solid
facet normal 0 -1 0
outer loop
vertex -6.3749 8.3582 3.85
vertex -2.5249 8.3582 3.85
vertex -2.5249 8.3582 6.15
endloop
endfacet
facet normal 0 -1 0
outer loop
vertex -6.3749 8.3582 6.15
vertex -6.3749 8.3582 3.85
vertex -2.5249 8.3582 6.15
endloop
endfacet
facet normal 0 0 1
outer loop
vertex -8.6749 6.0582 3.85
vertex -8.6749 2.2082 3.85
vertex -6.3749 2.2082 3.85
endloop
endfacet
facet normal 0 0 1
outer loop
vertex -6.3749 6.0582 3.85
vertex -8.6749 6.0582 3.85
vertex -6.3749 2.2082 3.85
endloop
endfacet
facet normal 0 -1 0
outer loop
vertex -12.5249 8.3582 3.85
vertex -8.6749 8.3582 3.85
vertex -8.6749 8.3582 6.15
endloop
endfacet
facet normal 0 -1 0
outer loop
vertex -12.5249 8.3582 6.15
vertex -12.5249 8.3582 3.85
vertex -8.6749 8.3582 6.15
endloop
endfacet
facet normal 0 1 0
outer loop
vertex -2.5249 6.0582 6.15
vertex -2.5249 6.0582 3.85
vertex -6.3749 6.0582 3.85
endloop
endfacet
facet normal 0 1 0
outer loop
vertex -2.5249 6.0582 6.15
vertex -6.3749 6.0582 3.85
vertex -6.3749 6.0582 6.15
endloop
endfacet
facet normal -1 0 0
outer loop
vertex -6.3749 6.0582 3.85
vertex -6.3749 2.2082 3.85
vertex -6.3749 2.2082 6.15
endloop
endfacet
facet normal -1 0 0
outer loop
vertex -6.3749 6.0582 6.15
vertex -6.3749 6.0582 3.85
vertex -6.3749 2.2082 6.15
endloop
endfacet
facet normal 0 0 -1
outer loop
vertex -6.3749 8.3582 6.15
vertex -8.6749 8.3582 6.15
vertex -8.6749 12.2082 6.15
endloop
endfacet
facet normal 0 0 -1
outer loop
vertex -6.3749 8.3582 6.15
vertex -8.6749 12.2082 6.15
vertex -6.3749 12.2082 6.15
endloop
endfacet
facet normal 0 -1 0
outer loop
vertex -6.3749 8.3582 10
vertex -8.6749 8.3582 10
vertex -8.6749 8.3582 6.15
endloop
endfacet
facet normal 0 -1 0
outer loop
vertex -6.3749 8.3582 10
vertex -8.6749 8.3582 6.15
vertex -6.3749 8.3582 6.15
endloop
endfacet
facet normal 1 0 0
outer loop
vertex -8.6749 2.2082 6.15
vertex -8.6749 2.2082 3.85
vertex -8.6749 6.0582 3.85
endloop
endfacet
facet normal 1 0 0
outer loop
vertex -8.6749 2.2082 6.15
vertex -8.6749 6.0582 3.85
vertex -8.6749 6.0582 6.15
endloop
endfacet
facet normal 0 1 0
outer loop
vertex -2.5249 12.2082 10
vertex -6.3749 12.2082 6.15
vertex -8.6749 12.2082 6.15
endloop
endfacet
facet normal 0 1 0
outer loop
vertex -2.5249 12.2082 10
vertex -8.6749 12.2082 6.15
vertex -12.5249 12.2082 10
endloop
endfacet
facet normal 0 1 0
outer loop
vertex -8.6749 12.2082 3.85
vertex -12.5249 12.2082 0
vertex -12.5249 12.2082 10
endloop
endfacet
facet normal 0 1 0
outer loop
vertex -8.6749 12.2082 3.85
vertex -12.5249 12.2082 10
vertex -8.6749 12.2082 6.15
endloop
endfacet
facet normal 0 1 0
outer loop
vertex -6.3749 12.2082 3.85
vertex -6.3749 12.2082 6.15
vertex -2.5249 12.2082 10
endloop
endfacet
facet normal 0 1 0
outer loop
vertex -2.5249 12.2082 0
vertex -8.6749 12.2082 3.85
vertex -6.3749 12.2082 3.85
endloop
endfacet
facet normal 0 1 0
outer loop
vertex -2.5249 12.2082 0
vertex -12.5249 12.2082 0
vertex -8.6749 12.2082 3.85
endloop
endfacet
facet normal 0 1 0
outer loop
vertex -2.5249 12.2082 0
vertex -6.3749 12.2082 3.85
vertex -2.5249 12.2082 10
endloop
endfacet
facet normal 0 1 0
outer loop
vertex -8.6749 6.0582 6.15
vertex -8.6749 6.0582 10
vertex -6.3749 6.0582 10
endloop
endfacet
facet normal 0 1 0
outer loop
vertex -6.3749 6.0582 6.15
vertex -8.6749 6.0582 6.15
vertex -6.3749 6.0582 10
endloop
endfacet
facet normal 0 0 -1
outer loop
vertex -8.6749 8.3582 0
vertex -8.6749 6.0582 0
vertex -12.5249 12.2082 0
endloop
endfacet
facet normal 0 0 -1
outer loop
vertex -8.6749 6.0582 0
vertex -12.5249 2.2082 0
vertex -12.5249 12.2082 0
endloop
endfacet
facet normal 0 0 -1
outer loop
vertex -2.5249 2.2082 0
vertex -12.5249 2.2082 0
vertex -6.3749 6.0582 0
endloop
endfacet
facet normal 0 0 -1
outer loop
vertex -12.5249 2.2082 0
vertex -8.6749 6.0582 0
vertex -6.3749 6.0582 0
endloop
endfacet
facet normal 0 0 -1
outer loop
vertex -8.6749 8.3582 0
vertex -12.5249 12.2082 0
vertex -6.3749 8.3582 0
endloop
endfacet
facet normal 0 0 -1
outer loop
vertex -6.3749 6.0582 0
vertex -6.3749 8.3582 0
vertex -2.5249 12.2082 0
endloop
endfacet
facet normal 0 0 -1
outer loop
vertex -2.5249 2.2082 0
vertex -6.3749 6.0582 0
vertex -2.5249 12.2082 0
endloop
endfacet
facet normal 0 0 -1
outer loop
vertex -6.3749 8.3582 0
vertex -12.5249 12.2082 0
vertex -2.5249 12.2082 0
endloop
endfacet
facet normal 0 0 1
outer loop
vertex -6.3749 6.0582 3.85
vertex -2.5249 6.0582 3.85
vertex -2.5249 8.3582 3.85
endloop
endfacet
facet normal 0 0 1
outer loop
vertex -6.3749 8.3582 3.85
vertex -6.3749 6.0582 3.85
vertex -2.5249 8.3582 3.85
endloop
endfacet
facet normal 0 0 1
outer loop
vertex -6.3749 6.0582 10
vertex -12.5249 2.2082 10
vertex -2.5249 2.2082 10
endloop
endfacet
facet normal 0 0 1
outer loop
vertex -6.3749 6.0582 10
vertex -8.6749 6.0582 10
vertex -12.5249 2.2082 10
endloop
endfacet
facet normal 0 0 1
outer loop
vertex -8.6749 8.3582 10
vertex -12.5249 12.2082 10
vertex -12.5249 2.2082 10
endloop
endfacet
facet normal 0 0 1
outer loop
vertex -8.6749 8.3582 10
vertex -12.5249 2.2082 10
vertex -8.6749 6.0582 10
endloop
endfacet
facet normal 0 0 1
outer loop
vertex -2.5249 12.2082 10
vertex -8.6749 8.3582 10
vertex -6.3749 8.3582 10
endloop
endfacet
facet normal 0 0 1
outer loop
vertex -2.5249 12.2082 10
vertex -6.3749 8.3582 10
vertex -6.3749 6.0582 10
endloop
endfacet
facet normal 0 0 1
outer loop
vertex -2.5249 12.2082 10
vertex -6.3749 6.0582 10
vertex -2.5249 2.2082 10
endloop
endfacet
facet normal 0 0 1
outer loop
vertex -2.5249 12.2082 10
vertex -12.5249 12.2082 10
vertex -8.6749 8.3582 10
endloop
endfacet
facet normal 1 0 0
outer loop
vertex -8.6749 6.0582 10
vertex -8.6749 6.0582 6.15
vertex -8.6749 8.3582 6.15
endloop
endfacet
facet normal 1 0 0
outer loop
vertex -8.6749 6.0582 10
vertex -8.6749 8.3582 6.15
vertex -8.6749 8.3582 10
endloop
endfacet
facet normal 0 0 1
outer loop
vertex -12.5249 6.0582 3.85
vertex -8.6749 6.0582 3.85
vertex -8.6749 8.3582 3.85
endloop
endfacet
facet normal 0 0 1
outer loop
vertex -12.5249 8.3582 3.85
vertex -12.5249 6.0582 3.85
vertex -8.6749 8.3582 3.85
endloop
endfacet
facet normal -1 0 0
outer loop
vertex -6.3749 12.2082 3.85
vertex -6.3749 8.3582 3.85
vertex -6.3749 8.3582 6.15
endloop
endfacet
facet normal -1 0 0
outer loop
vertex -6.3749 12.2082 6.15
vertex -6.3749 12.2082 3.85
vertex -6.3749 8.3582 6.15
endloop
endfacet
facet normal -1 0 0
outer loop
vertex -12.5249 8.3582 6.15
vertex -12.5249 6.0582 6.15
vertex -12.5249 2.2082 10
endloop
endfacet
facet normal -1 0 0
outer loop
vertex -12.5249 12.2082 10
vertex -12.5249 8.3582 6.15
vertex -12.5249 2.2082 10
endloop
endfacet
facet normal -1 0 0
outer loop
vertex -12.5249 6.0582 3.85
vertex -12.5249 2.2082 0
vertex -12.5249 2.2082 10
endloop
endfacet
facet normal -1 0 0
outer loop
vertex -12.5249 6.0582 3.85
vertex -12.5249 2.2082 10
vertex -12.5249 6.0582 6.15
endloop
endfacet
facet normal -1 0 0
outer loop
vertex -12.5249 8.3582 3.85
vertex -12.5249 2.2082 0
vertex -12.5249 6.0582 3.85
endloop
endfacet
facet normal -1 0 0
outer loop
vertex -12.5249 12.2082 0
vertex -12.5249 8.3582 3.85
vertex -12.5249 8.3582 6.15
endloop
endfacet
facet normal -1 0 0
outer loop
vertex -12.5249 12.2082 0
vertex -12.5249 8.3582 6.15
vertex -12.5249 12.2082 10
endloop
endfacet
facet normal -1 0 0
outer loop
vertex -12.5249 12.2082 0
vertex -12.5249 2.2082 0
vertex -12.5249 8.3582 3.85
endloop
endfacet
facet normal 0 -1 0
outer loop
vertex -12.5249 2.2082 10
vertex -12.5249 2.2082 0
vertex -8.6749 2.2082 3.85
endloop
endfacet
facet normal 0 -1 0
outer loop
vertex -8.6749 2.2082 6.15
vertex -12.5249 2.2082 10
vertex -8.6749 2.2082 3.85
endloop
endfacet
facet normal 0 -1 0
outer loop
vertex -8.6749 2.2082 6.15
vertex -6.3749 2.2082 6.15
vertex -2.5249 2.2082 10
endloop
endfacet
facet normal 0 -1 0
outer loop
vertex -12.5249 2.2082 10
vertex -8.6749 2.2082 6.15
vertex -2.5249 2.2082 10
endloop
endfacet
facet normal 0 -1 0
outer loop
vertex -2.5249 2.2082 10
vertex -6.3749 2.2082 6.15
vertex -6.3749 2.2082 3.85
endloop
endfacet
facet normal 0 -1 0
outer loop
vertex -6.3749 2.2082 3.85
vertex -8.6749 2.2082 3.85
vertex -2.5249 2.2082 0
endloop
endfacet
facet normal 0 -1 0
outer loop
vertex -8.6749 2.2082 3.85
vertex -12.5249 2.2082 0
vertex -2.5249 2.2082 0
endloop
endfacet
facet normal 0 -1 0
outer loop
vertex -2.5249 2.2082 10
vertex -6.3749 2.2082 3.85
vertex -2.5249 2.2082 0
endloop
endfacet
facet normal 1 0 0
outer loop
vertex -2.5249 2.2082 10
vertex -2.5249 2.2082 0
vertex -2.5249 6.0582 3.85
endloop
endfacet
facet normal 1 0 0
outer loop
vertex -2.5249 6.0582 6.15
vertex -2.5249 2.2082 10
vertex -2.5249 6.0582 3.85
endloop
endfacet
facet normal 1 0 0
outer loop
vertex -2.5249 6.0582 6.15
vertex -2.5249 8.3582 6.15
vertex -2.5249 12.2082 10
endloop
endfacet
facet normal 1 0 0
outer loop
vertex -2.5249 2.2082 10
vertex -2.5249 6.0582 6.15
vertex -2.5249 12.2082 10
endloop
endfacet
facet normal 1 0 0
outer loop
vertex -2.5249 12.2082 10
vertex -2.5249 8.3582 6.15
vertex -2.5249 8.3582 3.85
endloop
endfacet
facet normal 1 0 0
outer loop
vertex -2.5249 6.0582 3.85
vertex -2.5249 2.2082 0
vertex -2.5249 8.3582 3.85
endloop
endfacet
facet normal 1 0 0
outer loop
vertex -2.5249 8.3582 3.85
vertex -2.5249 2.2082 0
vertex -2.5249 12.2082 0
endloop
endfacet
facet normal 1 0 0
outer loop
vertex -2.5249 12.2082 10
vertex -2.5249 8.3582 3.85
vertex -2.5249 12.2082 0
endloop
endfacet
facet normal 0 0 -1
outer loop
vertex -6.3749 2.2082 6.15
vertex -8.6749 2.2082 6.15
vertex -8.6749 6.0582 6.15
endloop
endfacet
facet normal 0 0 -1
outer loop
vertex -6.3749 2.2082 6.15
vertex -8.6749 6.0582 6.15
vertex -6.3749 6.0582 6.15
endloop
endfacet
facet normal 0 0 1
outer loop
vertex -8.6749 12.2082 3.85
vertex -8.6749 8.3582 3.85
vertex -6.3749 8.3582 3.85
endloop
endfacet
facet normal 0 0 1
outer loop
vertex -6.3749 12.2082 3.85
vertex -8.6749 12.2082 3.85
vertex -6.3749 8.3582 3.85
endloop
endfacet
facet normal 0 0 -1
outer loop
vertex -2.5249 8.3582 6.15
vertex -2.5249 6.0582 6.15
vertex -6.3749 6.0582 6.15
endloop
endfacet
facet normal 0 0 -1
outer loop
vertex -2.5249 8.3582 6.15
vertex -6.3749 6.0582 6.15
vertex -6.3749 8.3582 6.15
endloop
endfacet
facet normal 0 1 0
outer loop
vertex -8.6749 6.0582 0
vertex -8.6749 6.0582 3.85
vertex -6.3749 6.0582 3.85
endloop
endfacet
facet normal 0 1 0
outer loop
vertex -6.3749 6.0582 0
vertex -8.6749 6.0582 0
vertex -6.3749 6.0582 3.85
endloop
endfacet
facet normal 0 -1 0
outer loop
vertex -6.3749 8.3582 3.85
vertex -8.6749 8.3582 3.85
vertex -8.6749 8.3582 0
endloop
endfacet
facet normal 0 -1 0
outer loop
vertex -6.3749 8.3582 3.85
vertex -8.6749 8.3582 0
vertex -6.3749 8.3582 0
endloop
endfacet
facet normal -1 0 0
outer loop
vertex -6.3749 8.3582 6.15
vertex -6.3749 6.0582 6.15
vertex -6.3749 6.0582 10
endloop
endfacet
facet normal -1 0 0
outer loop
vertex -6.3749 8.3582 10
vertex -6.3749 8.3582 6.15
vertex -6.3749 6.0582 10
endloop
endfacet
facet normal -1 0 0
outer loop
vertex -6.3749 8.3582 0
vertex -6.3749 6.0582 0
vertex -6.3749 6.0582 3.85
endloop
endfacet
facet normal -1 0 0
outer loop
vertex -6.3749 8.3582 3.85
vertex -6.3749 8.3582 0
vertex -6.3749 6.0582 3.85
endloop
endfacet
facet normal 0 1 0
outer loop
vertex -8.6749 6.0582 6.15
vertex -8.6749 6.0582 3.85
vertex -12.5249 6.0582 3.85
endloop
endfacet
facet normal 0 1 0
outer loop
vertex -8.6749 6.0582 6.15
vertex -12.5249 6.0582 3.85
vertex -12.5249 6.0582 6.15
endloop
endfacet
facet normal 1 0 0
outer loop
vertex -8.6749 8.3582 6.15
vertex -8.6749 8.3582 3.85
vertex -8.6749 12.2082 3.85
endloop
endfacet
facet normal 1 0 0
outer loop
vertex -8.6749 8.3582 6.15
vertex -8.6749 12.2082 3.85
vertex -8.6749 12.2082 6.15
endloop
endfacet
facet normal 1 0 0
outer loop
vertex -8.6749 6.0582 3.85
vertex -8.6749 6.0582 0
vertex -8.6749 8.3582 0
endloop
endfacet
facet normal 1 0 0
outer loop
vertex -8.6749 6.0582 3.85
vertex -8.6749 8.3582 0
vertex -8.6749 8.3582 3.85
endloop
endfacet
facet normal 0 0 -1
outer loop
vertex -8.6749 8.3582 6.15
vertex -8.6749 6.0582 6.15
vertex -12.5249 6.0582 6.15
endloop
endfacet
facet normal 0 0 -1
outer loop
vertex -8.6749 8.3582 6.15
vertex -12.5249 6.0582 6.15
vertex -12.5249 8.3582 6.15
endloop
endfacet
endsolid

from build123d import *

# Parameters (mm, degrees)
F0_W     = 10
F0_H     = 10
F1_DEPTH = 10
F2_W     = 2.3
F2_H     = 2.3
F5_DEPTH = 10.001
F3_W     = 2.3
F3_H     = 2.3
F6_DEPTH = 10.001
F4_W     = 2.3
F4_H     = 2.3
F7_DEPTH = 10.001


with BuildPart() as f1:
    # F0 (on Top) → F1 (new body)
    with BuildSketch(Plane.XY):
        with Locations((-7.52488, 7.208158)):
            Rectangle(F0_W, F0_H)
    extrude(amount=F1_DEPTH)

    # F2 (on face) → F5 (cut, through all)
    with BuildSketch(Plane.XY.offset(10)):
        with Locations((-7.52488, 7.208158)):
            Rectangle(F2_W, F2_H)
    extrude(amount=-F5_DEPTH, mode=Mode.SUBTRACT)

    # F3 (on face) → F6 (cut, through all)
    with BuildSketch(Plane.XZ.offset(-2.208158)):
        with Locations((-7.52488, 5)):
            Rectangle(F3_W, F3_H)
    extrude(amount=-F6_DEPTH, mode=Mode.SUBTRACT)

    # F4 (on face) → F7 (cut, through all)
    with BuildSketch(Plane.YZ.offset(-2.52488)):
        with Locations((7.208158, 5)):
            Rectangle(F4_W, F4_H)
    extrude(amount=-F7_DEPTH, mode=Mode.SUBTRACT)


solid = f1.part
